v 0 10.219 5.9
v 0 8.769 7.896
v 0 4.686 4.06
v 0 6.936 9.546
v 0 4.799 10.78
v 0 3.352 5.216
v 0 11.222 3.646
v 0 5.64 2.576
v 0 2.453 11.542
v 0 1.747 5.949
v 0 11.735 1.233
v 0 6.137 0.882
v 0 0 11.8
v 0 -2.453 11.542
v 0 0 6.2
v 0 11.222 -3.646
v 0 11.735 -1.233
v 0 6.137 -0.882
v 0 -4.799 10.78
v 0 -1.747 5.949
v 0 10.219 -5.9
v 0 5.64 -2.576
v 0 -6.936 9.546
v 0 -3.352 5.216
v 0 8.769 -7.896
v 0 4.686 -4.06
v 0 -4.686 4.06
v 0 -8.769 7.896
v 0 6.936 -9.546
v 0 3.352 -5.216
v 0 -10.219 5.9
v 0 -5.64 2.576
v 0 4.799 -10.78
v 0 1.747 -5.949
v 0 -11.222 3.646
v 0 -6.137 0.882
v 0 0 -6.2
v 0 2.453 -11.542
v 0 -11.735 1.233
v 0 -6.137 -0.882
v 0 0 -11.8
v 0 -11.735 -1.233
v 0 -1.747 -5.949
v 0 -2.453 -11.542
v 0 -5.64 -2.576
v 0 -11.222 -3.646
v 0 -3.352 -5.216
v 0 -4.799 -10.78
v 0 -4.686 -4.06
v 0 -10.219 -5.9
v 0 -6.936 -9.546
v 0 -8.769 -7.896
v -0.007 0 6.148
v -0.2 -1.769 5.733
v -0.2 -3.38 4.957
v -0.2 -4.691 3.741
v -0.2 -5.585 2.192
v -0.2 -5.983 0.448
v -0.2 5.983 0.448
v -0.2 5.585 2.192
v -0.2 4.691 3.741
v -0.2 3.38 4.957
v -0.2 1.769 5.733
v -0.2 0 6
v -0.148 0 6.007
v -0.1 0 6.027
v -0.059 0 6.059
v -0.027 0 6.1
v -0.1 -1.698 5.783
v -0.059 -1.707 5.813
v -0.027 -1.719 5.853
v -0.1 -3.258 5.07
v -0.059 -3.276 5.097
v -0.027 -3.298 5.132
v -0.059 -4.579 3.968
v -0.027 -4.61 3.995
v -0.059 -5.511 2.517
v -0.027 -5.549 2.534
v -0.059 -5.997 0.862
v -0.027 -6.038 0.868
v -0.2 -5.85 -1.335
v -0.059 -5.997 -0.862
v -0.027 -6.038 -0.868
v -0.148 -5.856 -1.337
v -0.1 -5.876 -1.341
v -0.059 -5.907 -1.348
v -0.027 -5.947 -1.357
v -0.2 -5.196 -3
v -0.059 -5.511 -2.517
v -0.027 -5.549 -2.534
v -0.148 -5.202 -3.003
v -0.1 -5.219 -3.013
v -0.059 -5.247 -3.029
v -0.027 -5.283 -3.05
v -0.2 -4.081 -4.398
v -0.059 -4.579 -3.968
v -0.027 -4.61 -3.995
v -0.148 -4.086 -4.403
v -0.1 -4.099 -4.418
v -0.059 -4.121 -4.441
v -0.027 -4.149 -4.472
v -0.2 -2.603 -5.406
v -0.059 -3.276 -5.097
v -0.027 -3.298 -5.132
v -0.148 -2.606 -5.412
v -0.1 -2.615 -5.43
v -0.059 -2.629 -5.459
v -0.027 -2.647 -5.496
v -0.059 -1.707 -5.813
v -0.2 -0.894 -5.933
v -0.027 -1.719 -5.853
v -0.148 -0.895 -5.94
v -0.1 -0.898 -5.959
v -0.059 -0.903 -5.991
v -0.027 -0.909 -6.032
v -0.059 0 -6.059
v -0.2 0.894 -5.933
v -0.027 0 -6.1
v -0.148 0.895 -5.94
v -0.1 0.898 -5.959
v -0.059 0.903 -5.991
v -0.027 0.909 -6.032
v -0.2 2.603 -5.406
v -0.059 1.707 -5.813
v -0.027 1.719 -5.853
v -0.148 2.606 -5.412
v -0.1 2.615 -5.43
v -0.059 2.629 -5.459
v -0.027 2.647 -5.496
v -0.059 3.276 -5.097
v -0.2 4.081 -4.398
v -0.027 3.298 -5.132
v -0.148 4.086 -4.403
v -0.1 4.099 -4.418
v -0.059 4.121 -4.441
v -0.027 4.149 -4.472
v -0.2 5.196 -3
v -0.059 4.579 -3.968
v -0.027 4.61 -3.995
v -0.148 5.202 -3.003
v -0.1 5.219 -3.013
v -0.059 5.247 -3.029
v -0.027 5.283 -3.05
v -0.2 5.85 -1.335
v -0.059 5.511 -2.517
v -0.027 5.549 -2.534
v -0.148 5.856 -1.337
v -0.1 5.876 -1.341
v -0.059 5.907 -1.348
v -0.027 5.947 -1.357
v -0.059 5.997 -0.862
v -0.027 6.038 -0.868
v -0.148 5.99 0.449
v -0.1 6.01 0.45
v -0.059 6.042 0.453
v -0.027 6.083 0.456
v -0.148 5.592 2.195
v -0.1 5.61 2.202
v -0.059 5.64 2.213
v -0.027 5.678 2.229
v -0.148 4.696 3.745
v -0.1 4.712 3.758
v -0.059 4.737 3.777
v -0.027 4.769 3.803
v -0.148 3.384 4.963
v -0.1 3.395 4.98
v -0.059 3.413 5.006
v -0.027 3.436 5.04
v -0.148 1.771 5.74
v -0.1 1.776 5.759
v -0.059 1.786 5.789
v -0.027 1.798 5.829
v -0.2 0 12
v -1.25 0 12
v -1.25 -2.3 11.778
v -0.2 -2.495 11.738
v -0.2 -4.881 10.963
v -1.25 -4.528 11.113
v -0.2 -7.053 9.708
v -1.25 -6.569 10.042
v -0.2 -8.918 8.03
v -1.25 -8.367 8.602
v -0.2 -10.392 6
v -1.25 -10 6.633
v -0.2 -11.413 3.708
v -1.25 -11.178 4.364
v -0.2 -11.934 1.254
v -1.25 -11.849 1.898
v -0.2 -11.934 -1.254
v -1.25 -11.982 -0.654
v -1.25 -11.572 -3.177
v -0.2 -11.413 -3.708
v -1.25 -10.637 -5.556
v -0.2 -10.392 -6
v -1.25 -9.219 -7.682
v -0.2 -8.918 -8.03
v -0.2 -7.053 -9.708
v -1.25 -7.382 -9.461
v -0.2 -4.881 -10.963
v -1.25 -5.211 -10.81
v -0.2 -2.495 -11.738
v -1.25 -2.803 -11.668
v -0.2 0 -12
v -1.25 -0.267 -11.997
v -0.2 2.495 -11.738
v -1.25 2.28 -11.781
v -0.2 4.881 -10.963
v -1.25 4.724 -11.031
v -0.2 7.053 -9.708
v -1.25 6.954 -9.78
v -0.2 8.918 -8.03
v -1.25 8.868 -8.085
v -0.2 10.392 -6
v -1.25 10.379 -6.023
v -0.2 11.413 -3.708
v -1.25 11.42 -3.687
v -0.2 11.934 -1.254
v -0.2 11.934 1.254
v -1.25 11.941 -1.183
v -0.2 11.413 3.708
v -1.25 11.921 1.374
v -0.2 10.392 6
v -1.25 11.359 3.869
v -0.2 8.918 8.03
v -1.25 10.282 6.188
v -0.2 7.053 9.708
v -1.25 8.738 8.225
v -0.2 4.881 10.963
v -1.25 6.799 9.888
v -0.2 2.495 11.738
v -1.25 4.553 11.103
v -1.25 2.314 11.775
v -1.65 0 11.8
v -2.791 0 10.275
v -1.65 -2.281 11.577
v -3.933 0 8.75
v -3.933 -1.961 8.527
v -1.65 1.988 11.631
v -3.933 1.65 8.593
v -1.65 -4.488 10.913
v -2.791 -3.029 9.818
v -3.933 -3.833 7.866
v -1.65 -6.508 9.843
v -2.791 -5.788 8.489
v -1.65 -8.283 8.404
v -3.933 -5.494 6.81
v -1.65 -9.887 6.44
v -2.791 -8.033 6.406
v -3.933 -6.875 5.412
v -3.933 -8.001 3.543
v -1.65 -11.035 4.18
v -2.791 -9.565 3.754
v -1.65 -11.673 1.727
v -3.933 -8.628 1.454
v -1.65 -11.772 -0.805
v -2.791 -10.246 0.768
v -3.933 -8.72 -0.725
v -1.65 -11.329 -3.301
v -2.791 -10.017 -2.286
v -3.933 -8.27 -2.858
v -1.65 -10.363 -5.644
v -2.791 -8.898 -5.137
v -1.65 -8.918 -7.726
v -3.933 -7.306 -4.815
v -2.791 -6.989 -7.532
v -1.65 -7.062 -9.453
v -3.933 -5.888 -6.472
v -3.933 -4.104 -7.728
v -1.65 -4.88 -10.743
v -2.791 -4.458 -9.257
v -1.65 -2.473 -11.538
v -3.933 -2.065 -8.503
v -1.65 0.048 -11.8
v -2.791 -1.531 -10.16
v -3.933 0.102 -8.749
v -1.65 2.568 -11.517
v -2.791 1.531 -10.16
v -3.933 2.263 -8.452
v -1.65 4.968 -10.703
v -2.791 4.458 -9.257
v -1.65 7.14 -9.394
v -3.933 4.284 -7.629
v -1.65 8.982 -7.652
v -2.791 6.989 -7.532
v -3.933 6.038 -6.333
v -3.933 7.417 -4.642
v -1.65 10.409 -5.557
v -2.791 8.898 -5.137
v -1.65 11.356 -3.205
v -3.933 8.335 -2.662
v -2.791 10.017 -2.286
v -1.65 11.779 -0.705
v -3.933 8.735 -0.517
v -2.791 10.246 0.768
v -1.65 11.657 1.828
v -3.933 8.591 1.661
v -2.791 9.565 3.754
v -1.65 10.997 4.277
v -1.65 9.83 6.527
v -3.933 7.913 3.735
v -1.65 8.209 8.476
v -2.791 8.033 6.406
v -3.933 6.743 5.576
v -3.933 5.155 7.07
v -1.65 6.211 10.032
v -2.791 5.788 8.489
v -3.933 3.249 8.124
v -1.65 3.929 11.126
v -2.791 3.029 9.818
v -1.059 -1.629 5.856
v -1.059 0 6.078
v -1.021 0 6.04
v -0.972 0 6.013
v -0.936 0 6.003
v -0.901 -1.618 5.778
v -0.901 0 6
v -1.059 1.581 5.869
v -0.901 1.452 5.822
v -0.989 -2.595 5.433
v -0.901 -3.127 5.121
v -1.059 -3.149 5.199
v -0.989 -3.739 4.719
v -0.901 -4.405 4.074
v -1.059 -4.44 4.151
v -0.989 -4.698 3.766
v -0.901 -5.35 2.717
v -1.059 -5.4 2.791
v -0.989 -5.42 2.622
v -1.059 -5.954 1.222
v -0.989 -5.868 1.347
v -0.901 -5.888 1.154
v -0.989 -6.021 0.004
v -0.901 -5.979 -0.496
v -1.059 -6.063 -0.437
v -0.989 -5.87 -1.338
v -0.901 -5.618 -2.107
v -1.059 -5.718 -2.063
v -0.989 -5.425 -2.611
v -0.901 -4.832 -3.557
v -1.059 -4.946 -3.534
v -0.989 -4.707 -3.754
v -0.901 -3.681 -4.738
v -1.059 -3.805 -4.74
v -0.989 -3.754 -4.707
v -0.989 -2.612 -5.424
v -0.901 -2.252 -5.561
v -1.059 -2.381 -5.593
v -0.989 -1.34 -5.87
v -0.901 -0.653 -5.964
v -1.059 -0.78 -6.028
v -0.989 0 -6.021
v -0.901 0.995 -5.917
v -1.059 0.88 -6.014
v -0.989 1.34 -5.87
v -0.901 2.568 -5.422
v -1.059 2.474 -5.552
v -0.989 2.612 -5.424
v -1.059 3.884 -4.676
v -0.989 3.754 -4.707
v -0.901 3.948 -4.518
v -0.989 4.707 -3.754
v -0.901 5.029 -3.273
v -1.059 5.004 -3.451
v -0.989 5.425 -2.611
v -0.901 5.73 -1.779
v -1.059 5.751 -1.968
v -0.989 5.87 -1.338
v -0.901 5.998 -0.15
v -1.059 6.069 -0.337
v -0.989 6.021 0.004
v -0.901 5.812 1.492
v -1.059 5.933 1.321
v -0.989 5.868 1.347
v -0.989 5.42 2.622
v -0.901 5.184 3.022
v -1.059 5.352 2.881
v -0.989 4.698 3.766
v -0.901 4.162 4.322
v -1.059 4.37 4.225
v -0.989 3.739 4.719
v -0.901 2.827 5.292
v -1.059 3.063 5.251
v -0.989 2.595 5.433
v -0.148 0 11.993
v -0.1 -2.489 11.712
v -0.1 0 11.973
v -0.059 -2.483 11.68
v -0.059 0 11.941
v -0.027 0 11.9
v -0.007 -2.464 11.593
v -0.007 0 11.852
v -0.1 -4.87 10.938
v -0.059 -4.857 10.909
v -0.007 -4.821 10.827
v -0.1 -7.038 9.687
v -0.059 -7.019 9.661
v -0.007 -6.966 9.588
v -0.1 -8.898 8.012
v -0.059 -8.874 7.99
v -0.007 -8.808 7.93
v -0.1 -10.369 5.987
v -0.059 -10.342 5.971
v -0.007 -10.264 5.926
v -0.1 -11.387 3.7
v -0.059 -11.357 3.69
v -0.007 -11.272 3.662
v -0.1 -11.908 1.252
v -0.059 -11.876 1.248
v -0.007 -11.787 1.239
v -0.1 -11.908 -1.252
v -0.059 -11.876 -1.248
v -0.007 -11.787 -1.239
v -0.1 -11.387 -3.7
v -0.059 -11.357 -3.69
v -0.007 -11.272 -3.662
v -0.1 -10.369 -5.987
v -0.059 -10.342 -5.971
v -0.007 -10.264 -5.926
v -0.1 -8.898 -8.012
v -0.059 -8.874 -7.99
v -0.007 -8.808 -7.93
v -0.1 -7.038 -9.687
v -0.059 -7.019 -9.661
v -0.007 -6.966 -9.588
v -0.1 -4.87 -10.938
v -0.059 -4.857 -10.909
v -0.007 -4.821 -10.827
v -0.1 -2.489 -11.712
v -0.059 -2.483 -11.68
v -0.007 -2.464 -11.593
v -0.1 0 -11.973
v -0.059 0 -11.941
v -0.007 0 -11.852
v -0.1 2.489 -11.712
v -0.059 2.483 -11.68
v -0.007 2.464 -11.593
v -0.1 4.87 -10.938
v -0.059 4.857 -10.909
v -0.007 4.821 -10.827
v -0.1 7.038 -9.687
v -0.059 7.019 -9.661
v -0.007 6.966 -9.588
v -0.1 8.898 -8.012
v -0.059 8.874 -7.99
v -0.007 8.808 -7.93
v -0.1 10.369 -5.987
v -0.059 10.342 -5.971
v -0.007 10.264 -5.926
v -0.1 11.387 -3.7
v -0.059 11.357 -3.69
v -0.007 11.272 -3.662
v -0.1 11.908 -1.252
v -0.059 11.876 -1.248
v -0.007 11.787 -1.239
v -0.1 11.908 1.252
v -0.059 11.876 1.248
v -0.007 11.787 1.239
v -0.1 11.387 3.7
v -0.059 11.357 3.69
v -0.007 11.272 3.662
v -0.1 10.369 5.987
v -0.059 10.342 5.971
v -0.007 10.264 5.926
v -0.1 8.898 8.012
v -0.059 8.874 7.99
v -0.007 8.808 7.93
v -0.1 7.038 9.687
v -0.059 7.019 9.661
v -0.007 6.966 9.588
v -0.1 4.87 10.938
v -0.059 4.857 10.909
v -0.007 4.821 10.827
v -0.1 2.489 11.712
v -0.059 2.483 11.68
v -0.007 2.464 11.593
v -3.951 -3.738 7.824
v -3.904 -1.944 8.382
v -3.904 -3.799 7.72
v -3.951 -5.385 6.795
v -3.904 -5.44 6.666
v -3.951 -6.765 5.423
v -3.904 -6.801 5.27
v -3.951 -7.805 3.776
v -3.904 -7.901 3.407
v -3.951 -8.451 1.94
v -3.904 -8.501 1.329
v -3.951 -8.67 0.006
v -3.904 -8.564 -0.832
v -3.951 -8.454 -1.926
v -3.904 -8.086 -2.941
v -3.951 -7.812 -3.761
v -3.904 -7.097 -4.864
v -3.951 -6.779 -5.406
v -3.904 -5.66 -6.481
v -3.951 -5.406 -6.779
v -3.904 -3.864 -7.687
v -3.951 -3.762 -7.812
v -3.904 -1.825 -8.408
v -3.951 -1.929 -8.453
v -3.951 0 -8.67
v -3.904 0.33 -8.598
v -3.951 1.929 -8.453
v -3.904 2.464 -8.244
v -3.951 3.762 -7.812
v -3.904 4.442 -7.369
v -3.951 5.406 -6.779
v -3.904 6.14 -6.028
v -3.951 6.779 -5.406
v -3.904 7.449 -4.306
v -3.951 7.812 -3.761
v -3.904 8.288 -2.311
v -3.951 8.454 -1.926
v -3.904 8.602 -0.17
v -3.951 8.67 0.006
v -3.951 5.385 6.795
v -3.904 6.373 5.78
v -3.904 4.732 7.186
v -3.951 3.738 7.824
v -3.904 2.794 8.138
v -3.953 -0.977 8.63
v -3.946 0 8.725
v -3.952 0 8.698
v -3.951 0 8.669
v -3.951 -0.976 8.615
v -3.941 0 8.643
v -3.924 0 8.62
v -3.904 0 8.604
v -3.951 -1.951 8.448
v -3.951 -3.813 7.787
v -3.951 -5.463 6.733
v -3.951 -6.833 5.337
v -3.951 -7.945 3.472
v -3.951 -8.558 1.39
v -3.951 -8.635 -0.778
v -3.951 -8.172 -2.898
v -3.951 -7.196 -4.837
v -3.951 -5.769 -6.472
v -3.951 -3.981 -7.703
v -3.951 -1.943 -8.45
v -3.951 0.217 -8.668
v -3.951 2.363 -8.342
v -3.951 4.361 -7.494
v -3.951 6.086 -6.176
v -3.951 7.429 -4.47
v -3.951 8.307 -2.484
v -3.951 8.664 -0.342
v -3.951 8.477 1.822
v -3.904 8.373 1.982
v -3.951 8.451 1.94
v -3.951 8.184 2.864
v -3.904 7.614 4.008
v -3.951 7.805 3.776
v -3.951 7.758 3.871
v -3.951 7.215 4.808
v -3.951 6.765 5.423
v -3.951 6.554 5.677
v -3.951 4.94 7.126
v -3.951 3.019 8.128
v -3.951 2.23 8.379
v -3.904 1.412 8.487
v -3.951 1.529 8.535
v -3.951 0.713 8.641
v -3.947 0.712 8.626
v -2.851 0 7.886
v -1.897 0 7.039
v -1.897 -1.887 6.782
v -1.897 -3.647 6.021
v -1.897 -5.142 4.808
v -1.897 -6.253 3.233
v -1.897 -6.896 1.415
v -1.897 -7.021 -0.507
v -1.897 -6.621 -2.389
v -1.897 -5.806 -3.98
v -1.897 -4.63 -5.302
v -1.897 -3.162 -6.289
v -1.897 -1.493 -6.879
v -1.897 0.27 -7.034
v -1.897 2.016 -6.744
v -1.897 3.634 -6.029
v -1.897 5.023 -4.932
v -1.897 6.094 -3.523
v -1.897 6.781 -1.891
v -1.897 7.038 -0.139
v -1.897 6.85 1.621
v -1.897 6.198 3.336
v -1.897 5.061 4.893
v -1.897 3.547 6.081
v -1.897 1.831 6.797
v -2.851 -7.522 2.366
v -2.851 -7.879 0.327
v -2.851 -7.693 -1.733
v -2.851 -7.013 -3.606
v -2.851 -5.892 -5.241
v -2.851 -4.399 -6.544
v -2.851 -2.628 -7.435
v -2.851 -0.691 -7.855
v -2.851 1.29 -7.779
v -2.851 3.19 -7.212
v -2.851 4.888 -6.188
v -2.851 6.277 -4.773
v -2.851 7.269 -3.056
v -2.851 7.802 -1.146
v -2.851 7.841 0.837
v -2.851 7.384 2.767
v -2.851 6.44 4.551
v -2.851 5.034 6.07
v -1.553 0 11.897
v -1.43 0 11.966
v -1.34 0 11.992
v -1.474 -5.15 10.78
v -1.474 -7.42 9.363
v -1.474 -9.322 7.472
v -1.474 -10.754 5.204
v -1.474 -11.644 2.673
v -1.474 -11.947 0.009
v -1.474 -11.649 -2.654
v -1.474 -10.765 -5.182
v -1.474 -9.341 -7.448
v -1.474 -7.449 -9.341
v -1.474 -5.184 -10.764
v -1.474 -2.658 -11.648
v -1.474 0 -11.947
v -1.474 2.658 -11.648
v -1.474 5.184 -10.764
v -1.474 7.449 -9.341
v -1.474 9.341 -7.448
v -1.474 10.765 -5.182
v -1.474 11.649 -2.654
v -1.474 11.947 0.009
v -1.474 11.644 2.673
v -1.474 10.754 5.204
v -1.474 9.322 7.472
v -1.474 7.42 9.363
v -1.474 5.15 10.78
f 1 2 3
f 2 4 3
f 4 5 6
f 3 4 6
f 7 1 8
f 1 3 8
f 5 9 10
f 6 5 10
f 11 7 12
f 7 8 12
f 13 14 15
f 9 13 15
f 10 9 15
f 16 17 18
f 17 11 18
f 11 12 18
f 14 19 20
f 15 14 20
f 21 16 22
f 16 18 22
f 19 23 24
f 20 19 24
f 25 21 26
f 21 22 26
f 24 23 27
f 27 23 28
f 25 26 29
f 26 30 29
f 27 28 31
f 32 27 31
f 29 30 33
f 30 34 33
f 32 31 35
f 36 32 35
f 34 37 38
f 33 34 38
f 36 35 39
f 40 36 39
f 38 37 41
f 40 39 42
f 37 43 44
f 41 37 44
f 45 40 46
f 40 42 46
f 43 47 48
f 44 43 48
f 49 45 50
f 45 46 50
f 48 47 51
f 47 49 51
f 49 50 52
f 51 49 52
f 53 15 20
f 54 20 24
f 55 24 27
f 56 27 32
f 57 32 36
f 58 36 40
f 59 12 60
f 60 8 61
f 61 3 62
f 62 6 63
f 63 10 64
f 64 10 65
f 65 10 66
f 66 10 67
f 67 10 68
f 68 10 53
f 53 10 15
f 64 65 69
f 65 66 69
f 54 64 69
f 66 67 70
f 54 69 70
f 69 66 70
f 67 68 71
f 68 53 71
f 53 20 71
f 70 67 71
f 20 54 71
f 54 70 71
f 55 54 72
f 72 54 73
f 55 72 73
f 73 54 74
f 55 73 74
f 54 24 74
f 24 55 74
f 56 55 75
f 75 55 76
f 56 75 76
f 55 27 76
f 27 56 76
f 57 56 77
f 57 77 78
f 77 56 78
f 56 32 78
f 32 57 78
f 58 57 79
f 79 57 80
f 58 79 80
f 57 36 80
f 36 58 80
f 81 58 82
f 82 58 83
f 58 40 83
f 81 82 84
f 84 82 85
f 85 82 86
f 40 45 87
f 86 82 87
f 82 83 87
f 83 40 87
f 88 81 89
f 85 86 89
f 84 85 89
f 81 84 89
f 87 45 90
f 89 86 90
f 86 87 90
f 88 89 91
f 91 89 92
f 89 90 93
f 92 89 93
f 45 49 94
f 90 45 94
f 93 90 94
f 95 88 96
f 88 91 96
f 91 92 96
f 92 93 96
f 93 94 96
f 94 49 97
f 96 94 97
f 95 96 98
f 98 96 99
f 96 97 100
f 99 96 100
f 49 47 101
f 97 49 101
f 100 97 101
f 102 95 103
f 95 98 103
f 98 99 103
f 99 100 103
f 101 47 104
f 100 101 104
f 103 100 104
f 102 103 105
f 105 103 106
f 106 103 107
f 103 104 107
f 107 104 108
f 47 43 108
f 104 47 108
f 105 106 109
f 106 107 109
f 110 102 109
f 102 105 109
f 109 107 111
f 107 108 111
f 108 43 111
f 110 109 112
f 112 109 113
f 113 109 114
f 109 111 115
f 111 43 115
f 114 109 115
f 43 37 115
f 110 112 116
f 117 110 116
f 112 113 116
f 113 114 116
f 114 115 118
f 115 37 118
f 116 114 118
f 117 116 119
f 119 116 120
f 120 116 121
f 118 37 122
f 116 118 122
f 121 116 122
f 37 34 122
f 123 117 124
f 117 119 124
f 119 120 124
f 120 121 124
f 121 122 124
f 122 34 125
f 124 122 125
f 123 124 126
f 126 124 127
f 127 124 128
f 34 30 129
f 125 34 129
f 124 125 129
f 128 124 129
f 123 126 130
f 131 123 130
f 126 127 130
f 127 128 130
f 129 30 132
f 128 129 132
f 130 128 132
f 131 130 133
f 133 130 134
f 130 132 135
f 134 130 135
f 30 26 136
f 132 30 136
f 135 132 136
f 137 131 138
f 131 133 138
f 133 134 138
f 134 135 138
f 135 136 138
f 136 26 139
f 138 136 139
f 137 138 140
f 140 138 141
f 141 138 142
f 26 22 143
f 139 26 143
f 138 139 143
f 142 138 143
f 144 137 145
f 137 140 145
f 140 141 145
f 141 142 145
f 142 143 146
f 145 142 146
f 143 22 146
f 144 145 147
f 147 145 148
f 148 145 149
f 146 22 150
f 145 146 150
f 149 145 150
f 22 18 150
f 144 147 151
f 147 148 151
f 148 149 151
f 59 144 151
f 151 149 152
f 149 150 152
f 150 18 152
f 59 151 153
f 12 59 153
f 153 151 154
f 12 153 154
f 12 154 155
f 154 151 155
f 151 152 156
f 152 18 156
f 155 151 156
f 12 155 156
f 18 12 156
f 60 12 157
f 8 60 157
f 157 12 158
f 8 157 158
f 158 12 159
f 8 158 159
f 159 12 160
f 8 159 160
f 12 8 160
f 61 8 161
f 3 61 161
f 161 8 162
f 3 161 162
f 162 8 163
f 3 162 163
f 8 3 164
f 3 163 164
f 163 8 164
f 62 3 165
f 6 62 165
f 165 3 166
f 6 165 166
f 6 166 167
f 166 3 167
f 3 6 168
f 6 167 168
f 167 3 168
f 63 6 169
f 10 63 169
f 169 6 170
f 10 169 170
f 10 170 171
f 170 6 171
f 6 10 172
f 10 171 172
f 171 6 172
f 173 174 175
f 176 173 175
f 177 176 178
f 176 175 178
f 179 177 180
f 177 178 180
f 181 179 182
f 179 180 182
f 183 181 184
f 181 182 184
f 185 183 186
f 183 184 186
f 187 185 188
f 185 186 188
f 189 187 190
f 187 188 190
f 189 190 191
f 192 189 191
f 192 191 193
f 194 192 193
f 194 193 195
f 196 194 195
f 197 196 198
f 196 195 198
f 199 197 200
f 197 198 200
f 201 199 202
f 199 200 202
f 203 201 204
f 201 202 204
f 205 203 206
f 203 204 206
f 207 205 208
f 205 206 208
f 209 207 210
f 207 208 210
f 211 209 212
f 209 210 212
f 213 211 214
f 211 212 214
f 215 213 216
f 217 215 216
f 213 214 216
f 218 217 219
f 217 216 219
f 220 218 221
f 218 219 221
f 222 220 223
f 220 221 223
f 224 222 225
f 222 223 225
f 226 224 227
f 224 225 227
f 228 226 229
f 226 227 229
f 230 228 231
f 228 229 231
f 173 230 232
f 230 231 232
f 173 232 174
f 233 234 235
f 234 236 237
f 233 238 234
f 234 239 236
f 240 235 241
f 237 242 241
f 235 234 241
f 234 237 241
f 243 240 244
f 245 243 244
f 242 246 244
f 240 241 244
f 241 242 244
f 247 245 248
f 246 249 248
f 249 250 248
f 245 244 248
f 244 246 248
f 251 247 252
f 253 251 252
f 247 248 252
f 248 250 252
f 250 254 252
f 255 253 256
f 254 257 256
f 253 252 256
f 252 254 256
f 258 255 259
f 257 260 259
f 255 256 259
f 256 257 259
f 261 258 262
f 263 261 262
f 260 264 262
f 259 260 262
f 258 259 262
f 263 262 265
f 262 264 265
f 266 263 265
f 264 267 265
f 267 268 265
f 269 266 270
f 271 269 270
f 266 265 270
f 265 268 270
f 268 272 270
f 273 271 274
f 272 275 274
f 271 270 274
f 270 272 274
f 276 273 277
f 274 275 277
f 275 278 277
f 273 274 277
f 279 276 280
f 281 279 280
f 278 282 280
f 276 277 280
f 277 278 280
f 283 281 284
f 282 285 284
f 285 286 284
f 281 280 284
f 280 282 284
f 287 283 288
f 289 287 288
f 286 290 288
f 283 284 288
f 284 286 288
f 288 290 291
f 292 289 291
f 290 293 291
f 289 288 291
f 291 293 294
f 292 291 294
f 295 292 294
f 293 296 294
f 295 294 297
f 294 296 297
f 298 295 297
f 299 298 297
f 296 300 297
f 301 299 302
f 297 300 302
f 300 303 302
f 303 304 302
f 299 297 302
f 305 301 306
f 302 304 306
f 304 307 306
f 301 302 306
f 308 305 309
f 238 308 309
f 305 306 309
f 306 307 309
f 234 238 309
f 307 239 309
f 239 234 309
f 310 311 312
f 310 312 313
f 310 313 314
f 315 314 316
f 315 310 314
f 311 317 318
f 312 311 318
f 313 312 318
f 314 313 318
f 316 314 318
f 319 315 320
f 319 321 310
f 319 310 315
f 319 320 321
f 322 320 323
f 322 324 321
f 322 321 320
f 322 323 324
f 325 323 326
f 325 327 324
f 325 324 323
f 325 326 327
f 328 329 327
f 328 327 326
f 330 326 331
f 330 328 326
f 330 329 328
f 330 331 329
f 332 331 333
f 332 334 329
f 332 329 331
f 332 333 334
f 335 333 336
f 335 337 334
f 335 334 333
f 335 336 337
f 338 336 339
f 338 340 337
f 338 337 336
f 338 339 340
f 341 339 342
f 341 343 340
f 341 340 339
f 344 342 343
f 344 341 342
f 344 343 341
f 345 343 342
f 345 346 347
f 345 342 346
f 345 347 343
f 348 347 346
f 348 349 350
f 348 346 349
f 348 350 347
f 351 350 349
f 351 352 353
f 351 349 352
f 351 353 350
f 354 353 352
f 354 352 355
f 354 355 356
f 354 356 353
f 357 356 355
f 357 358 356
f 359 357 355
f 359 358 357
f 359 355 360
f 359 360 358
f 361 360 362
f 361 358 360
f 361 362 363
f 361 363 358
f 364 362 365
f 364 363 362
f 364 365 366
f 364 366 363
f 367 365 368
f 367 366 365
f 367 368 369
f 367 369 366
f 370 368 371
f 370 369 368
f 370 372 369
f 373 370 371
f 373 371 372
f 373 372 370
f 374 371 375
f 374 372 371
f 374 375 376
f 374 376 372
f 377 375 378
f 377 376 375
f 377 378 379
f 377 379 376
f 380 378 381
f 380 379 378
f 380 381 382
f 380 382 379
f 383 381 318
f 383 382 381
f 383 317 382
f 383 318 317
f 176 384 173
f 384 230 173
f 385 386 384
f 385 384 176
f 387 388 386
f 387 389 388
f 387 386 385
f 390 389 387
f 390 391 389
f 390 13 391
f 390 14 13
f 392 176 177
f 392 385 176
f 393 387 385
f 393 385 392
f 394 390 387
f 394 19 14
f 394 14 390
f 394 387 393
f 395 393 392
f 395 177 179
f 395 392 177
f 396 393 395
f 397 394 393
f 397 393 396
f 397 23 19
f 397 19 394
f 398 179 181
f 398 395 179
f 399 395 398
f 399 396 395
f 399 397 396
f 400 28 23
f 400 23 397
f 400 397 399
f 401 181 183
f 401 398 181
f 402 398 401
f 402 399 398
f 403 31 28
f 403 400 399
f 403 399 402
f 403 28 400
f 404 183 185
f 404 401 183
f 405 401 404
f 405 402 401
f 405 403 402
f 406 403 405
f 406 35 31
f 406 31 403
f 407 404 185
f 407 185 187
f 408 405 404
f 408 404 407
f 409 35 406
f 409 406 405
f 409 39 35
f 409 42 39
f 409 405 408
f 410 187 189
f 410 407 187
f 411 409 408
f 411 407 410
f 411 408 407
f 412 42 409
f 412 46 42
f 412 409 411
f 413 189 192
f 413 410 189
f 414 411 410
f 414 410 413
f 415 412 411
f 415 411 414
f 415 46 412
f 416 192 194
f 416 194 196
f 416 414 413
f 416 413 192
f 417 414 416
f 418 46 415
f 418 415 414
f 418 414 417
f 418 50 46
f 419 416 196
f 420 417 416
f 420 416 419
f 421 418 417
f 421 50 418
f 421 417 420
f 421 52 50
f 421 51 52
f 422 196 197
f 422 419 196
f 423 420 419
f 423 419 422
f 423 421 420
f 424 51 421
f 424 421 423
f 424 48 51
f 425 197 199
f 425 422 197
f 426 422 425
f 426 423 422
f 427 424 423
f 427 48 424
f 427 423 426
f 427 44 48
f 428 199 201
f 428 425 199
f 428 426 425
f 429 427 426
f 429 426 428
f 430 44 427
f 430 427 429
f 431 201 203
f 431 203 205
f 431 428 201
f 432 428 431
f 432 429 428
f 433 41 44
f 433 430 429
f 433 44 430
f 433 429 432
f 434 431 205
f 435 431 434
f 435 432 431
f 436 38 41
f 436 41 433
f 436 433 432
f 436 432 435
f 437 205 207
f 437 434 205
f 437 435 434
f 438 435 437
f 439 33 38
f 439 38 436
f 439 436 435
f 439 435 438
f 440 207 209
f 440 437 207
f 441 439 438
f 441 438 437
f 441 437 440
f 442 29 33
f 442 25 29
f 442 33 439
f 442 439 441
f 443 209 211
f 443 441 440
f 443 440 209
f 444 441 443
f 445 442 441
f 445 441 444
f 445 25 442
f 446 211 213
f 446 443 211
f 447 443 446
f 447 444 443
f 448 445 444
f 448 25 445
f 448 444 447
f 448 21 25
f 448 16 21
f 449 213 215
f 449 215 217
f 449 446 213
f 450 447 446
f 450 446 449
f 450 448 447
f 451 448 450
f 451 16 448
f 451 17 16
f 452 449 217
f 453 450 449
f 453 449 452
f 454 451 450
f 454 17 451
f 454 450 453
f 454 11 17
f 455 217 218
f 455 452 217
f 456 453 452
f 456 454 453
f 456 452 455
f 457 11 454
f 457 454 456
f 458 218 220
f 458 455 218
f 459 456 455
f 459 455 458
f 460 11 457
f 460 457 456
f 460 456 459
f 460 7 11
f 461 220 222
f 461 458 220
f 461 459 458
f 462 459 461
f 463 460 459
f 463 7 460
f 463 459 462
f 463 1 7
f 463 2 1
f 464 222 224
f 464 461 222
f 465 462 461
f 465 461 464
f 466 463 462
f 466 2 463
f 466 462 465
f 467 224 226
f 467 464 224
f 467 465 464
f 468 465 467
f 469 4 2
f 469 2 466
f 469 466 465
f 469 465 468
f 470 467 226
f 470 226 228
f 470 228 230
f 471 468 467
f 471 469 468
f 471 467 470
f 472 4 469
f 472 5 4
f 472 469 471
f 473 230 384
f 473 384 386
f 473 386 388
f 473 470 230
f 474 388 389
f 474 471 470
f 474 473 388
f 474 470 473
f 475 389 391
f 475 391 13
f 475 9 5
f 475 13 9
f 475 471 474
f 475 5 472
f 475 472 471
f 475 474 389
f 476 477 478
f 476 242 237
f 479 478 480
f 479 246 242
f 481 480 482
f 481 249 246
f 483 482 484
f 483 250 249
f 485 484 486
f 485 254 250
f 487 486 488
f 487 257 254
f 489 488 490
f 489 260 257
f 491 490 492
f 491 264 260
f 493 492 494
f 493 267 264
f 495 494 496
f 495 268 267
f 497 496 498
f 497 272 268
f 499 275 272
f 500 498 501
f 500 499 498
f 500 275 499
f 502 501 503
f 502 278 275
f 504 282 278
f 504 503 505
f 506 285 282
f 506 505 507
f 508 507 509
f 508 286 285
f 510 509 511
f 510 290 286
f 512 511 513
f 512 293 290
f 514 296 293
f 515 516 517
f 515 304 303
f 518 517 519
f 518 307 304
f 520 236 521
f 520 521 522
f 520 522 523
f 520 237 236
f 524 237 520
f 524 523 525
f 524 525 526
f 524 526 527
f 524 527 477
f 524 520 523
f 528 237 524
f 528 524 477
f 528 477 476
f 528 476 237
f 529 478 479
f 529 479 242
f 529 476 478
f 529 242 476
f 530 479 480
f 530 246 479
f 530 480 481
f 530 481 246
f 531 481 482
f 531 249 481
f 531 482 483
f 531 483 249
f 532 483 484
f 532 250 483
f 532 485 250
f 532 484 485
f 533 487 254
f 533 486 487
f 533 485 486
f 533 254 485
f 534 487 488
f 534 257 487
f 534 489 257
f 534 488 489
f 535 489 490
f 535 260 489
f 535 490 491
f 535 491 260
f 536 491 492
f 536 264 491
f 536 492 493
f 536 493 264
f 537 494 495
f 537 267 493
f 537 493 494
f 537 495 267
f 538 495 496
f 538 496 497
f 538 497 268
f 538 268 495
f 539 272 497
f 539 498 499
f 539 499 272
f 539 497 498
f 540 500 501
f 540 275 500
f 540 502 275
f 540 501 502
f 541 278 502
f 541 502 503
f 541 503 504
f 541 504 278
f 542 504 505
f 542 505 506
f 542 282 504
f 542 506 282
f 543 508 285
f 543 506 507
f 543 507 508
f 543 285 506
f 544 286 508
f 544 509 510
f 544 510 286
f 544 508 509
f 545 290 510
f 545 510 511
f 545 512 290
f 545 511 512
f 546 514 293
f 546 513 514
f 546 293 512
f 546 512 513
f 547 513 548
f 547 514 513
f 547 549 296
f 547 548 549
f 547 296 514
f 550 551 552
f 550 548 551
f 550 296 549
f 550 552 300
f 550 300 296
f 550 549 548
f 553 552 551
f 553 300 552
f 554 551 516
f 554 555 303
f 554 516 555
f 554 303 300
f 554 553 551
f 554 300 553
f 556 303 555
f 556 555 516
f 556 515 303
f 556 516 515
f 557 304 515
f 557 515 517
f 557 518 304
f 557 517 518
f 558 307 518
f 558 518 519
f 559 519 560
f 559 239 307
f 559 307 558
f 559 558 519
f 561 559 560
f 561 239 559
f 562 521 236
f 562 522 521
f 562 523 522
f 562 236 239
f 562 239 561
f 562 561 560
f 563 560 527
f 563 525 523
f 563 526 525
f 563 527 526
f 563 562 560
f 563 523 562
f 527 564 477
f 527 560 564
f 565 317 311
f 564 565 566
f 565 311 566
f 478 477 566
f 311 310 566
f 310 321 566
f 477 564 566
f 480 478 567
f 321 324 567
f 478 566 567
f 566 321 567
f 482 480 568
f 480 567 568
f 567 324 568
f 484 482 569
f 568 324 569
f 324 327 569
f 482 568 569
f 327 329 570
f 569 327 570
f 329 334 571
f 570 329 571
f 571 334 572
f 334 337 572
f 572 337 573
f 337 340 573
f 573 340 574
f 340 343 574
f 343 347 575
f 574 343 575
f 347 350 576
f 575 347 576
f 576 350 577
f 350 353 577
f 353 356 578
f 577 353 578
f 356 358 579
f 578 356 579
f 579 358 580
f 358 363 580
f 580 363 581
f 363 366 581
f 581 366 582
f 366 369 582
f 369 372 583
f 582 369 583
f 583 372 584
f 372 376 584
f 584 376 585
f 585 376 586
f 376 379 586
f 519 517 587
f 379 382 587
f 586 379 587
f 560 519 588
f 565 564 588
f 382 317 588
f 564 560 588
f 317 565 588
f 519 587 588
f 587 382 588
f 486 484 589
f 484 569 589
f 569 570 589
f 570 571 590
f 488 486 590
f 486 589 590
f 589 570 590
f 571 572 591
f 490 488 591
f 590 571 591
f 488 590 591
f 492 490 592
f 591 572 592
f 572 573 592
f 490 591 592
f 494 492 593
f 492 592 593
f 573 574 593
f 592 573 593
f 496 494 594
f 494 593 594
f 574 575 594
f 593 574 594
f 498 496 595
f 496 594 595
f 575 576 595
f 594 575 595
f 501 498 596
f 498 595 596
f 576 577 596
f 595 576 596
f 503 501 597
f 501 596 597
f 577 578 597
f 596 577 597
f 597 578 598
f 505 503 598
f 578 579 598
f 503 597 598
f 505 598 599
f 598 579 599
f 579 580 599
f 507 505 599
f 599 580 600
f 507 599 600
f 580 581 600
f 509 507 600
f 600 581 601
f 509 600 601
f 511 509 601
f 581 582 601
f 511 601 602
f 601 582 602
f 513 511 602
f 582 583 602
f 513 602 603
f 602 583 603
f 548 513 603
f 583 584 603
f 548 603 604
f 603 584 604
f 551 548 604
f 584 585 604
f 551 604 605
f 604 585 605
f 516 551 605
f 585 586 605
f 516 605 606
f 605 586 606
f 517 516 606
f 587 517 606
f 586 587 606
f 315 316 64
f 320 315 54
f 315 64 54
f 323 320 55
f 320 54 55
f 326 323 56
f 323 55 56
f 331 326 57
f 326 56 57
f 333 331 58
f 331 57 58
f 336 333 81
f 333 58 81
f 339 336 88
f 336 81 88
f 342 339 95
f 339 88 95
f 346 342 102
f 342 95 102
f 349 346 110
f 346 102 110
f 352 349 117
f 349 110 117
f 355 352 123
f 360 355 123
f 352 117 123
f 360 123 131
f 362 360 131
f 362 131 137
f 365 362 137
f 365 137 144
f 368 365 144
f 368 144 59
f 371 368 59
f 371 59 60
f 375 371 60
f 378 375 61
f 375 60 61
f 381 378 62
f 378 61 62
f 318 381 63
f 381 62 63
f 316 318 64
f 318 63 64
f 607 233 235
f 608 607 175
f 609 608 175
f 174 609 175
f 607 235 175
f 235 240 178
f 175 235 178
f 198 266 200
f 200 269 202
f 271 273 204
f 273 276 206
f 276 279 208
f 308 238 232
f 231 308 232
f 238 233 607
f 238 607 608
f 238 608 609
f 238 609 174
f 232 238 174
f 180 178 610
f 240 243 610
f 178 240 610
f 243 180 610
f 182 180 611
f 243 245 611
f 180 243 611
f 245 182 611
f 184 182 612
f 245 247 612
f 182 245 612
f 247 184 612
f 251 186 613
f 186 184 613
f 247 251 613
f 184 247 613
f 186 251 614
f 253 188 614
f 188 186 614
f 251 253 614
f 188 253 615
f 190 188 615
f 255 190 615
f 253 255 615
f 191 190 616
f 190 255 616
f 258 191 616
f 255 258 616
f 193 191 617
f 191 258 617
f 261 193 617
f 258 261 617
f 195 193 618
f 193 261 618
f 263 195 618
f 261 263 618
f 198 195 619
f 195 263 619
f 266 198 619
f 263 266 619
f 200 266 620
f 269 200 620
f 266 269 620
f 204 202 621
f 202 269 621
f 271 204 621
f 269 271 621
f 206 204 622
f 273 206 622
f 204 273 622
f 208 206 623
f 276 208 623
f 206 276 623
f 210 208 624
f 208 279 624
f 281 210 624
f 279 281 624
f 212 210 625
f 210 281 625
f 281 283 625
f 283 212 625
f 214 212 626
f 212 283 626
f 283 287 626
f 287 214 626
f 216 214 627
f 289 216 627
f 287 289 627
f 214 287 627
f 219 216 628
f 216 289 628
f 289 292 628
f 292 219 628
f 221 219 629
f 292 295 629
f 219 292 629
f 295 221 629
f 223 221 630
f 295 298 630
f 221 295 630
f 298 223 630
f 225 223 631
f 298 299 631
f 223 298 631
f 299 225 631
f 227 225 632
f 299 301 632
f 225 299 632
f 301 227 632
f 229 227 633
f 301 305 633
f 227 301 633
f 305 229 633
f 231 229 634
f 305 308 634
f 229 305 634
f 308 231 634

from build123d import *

# Parameters (mm, degrees)
F2_R = 0.2
F3_R = 0.5
F4_R = 0.2
F5_R = 0.1
F6_R = 0.2


with BuildPart() as f1:
    # F0 (on Front) → F1 (revolve)
    with BuildSketch(Plane.XZ):
        with BuildLine():
            ThreePointArc((-4, 8.660254), (-2.3653, 7.482029), (-1, 6))
            Line((-1, 6), (0, 6))
            Line((0, 6), (0, 12))
            Line((0, 12), (-1.5, 12))
            Line((-1.5, 12), (-4, 8.660254))
        make_face()
    revolve(axis=Axis((-2.196088, 0, 0), (1, 0, 0)))

    # F2
    f2_edges = [f1.edges().sort_by_distance(p)[0] for p in [
        (-1, 0, -6),
    ]]
    fillet(f2_edges, radius=F2_R)

    # F3
    f3_edges = [f1.edges().sort_by_distance(p)[0] for p in [
        (-1.5, 0, -12),
    ]]
    fillet(f3_edges, radius=F3_R)

    # F4
    f4_edges = [f1.edges().sort_by_distance(p)[0] for p in [
        (0, 0, -12),
    ]]
    fillet(f4_edges, radius=F4_R)

    # F5
    f5_edges = [f1.edges().sort_by_distance(p)[0] for p in [
        (-4, 0, -8.660254),
    ]]
    fillet(f5_edges, radius=F5_R)

    # F6
    f6_edges = [f1.edges().sort_by_distance(p)[0] for p in [
        (0, 0, -6),
    ]]
    fillet(f6_edges, radius=F6_R)


solid = f1.part
